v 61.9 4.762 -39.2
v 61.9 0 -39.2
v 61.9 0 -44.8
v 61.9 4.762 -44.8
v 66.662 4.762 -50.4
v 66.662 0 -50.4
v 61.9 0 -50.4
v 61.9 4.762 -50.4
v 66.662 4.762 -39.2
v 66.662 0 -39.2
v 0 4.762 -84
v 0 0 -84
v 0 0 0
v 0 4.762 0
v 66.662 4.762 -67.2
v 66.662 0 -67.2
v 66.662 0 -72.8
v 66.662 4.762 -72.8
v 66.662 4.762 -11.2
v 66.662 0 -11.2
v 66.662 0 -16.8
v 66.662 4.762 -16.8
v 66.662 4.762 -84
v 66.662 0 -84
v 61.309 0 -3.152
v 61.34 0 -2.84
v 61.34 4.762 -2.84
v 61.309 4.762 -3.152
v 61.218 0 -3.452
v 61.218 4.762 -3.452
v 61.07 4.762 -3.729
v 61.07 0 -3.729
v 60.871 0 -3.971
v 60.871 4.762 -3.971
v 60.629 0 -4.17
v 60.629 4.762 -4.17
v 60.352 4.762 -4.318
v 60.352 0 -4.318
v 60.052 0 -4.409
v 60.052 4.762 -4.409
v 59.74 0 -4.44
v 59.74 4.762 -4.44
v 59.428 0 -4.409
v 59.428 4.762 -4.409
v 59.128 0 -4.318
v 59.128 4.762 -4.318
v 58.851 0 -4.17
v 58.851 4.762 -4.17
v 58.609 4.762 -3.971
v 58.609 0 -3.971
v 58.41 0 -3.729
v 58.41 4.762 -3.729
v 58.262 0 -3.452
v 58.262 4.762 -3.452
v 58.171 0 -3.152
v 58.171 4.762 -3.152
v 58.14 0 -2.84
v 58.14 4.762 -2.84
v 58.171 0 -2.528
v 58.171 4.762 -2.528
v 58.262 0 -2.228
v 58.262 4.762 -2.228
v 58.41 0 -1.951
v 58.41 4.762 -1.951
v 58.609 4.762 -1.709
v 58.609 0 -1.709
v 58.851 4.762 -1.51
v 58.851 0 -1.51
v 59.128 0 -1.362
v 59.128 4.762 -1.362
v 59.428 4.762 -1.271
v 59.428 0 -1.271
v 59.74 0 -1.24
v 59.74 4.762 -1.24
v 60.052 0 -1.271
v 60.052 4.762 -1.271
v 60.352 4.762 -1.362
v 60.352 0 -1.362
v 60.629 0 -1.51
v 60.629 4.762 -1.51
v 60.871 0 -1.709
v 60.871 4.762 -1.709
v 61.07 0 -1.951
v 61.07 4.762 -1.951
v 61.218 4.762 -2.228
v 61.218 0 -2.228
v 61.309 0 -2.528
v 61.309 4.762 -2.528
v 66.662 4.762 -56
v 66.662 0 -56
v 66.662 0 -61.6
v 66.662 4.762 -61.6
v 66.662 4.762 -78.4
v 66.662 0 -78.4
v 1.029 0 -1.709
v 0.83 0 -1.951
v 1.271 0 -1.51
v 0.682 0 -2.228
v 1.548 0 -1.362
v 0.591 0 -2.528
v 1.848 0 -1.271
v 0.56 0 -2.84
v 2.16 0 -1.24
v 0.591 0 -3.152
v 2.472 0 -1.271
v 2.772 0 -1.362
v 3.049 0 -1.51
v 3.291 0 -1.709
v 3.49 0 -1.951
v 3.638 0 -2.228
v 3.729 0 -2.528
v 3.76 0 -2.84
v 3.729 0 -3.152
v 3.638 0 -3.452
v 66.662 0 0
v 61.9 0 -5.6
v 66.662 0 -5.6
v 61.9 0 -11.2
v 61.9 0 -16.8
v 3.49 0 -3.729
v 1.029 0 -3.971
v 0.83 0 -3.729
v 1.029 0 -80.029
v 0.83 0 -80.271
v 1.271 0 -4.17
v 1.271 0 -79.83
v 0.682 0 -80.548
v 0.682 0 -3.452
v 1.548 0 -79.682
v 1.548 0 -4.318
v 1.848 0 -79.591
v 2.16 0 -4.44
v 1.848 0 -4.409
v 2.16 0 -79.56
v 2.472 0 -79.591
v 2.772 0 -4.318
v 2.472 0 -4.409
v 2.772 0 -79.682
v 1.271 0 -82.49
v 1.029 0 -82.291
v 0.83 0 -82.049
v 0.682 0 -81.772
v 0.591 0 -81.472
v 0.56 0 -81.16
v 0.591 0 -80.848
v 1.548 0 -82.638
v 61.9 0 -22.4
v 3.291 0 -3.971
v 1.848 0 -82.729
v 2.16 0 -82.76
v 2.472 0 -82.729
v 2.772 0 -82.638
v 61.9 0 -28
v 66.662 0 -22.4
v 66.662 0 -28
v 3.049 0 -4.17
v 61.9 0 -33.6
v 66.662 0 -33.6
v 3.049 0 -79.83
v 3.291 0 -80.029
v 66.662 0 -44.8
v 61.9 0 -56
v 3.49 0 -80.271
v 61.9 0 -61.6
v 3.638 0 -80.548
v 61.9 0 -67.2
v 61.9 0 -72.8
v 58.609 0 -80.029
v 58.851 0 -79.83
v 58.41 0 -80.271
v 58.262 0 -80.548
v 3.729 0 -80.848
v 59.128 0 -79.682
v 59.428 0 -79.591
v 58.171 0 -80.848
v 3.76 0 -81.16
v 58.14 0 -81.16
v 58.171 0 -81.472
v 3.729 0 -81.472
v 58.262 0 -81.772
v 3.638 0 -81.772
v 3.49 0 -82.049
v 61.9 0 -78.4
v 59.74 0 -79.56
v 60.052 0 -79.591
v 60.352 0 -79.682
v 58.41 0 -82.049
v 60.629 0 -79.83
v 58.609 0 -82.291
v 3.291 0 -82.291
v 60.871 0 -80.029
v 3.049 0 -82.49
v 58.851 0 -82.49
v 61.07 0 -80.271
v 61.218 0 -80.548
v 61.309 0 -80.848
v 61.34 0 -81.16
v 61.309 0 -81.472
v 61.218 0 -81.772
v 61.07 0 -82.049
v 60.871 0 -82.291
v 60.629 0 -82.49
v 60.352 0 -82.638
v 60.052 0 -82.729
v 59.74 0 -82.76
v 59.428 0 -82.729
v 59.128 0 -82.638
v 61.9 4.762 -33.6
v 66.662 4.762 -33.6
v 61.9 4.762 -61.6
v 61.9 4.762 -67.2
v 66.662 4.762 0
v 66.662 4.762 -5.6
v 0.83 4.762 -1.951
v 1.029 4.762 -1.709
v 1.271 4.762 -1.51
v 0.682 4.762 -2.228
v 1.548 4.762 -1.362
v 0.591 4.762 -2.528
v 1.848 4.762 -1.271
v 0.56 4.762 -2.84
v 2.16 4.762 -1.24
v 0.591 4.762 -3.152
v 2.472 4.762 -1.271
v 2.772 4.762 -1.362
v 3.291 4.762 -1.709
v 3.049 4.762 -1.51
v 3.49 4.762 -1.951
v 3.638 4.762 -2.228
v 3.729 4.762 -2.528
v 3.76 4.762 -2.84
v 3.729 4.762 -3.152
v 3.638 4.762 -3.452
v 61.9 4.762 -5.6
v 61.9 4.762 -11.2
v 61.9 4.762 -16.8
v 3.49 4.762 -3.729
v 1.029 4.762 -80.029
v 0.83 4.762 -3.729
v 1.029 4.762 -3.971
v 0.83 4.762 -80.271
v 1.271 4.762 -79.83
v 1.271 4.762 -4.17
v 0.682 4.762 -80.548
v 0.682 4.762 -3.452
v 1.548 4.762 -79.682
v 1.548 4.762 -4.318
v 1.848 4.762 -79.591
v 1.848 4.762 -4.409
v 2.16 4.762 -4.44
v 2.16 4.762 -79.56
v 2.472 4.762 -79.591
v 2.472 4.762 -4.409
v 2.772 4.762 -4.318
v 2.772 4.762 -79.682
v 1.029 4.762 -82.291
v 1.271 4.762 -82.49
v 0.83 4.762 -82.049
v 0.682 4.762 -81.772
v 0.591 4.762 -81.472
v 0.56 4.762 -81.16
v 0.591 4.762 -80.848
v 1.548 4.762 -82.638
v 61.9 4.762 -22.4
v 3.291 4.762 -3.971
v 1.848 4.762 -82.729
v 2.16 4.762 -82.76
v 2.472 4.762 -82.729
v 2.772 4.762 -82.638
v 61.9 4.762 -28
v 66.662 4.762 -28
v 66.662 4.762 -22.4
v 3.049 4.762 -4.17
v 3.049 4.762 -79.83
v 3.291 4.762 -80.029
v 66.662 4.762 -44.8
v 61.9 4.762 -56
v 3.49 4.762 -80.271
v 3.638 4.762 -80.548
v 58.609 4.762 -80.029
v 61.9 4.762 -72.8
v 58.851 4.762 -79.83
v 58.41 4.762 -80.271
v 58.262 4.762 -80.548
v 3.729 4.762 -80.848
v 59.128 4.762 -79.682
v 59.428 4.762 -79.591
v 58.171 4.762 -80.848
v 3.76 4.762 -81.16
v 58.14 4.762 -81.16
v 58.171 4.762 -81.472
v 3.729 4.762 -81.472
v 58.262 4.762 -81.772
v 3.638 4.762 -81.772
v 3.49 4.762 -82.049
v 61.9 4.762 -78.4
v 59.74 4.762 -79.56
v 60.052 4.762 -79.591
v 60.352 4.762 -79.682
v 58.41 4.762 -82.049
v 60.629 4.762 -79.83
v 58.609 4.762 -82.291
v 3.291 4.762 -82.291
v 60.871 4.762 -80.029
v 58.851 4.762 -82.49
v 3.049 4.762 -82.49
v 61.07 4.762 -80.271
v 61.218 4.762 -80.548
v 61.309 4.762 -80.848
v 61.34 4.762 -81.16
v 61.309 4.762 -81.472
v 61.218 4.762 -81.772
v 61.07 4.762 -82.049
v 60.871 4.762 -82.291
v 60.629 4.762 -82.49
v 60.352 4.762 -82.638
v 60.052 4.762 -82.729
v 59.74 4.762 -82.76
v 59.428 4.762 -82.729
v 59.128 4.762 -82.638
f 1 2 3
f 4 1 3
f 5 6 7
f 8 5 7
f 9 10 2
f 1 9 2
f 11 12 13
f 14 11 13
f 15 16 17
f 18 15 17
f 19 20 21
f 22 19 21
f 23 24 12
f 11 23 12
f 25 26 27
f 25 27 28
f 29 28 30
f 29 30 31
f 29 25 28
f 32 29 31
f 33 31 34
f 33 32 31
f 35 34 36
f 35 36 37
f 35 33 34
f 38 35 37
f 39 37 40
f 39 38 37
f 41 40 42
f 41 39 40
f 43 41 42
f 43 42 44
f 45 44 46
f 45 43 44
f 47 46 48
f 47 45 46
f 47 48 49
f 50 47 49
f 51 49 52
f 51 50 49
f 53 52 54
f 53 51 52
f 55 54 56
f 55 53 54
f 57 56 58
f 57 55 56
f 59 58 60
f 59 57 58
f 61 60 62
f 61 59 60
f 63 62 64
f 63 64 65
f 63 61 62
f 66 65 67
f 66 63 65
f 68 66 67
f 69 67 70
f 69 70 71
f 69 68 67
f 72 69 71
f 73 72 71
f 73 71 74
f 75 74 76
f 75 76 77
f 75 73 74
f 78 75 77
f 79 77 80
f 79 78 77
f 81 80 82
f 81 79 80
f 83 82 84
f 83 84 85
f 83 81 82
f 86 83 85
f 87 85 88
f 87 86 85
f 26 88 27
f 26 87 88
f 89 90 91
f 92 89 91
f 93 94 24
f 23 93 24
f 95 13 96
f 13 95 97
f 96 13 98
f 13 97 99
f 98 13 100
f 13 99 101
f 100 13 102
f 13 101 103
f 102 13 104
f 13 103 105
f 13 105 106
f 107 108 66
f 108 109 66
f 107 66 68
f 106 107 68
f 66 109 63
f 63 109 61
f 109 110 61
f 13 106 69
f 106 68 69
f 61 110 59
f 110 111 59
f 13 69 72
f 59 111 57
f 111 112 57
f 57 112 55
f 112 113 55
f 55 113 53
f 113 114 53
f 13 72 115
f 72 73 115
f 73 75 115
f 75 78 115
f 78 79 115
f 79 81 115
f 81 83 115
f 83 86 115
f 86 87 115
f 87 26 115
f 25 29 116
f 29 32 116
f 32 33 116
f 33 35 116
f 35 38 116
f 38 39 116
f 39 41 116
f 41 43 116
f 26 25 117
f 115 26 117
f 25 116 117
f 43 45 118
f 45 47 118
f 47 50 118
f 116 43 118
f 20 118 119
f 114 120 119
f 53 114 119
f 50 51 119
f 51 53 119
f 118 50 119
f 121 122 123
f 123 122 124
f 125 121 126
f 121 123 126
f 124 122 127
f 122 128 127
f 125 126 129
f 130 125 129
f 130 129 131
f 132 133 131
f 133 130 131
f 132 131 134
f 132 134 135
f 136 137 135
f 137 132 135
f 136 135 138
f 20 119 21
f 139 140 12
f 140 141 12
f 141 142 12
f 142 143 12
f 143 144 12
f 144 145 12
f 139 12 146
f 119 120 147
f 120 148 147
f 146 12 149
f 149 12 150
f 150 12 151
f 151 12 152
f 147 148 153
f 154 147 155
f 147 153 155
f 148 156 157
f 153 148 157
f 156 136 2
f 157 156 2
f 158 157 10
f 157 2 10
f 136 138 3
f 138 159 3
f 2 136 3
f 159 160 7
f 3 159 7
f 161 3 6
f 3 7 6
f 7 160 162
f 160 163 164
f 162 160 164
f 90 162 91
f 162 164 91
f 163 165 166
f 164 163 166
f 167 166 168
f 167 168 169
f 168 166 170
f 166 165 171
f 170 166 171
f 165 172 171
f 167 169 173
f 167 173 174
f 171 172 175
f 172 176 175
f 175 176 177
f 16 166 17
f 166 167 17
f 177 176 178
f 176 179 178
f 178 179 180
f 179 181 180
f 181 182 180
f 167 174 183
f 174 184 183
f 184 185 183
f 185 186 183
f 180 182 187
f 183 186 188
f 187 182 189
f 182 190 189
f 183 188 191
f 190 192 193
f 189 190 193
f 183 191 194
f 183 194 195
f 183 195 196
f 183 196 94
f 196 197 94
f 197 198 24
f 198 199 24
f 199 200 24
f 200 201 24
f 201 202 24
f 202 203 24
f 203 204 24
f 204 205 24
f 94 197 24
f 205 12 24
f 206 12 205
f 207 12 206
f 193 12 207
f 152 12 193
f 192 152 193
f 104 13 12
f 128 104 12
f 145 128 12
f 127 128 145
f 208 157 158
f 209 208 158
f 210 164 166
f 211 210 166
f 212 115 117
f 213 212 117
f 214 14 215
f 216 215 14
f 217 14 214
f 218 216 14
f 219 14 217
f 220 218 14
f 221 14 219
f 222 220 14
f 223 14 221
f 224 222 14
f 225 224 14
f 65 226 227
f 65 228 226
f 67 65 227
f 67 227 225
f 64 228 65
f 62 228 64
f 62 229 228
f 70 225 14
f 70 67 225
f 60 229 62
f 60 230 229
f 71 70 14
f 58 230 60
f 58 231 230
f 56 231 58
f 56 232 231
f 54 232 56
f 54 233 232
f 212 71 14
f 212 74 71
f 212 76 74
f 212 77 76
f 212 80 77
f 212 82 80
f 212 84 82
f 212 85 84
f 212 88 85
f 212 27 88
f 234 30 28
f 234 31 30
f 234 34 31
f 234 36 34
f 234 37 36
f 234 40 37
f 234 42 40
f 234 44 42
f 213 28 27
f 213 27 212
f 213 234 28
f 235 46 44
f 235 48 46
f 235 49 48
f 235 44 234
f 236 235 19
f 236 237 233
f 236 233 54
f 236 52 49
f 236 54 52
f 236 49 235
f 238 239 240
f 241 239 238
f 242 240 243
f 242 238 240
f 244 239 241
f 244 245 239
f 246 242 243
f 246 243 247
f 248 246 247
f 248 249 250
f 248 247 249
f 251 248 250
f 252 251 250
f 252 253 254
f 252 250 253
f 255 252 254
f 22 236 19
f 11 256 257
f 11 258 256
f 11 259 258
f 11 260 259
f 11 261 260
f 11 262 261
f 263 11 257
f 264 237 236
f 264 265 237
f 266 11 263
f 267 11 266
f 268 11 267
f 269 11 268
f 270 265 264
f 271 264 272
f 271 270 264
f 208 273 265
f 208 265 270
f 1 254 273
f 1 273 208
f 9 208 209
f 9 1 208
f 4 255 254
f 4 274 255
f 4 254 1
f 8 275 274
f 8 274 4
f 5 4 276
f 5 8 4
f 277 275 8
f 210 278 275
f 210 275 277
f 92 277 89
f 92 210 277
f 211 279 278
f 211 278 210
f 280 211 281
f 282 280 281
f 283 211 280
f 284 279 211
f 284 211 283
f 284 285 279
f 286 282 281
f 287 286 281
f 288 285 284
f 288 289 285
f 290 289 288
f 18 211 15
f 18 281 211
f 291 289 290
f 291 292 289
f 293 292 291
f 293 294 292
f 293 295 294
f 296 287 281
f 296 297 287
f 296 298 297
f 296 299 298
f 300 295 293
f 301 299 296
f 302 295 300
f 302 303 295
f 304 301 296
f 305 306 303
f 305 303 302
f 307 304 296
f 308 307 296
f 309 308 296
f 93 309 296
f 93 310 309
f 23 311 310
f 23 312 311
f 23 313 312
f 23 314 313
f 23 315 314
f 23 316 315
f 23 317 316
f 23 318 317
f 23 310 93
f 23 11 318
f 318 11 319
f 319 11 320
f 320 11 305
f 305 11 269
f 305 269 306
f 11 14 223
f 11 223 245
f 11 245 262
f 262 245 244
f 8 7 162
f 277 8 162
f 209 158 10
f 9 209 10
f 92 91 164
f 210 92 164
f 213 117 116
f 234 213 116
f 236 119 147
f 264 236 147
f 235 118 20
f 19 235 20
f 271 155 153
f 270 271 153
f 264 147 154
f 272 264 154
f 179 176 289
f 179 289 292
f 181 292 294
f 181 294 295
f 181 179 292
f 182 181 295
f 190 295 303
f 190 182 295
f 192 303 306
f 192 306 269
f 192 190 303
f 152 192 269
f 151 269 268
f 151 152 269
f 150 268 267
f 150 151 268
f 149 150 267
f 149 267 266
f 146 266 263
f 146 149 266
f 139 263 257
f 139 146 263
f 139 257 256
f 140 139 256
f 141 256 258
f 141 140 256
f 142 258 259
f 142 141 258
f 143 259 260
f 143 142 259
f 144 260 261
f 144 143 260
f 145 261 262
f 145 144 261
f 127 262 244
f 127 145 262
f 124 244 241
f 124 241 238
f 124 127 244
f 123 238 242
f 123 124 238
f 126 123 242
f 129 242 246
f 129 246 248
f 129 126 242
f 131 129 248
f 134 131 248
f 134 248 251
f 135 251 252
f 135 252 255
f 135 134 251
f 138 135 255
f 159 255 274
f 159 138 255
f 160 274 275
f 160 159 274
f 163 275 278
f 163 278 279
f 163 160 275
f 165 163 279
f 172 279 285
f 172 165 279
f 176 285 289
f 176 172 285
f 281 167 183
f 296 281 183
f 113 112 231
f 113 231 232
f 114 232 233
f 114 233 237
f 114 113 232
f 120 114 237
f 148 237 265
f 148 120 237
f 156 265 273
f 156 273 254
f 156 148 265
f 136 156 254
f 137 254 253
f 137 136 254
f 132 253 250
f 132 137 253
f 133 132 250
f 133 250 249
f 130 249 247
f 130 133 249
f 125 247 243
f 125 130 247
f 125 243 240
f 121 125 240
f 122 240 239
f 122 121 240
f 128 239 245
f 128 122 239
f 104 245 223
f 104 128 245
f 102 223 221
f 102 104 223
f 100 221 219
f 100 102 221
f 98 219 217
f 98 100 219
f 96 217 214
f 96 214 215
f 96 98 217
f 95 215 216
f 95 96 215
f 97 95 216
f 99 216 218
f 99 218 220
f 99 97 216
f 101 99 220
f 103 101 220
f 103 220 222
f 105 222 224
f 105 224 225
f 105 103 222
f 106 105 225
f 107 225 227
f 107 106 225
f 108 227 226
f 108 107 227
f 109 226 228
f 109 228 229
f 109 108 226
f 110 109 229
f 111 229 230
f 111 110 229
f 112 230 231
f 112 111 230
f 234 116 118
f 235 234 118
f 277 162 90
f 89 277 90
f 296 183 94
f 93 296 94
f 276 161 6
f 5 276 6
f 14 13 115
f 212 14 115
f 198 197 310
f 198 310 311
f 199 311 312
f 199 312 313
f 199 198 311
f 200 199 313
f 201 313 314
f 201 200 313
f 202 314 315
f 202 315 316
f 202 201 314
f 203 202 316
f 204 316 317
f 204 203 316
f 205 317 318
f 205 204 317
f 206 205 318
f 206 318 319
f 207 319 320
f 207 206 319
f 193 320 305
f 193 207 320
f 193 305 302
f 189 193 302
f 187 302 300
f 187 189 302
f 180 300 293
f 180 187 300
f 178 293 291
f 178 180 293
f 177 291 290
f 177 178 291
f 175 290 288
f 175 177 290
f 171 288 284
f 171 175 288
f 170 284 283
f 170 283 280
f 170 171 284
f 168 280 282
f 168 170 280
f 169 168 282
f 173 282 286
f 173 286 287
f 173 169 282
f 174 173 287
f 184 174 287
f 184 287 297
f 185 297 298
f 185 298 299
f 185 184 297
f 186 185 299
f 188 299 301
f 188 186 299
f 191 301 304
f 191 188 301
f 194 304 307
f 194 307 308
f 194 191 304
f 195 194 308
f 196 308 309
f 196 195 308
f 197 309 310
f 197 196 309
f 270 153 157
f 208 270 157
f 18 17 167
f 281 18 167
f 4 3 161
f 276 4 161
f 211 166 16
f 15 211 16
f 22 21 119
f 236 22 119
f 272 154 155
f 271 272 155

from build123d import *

# Parameters (mm, degrees)
SKETCH1_R           = 1.6
BOSS_EXTRUDE1_DEPTH = 4.7625


with BuildPart() as part:
    # Sketch1 → Boss-Extrude1 (new body)
    with BuildSketch(Plane(origin=(0, 0, 0), x_dir=(1, 0, 0), z_dir=(0, 1, 0))):
        Polygon((0, 0), (61.9, 0), (66.6625, 0), (66.6625, 5.6), (61.9, 5.6), (61.9, 11.2), (66.6625, 11.2), (66.6625, 16.8), (61.9, 16.8), (61.9, 22.4), (66.6625, 22.4), (66.6625, 28), (61.9, 28), (61.9, 33.6), (66.6625, 33.6), (66.6625, 39.2), (61.9, 39.2), (61.9, 44.8), (66.6625, 44.8), (66.6625, 50.4), (61.9, 50.4), (61.9, 56), (66.6625, 56), (66.6625, 61.6), (61.9, 61.6), (61.9, 67.2), (66.6625, 67.2), (66.6625, 72.8), (61.9, 72.8), (61.9, 78.4), (66.6625, 78.4), (66.6625, 84), (61.9, 84), (0, 84), align=None)
        with Locations((2.16, 81.16)):
            Circle(SKETCH1_R, mode=Mode.SUBTRACT)
        with Locations((2.16, 2.84)):
            Circle(SKETCH1_R, mode=Mode.SUBTRACT)
        with Locations((59.74, 2.84)):
            Circle(SKETCH1_R, mode=Mode.SUBTRACT)
        with Locations((59.74, 81.16)):
            Circle(SKETCH1_R, mode=Mode.SUBTRACT)
    extrude(amount=BOSS_EXTRUDE1_DEPTH)


solid = part.part
